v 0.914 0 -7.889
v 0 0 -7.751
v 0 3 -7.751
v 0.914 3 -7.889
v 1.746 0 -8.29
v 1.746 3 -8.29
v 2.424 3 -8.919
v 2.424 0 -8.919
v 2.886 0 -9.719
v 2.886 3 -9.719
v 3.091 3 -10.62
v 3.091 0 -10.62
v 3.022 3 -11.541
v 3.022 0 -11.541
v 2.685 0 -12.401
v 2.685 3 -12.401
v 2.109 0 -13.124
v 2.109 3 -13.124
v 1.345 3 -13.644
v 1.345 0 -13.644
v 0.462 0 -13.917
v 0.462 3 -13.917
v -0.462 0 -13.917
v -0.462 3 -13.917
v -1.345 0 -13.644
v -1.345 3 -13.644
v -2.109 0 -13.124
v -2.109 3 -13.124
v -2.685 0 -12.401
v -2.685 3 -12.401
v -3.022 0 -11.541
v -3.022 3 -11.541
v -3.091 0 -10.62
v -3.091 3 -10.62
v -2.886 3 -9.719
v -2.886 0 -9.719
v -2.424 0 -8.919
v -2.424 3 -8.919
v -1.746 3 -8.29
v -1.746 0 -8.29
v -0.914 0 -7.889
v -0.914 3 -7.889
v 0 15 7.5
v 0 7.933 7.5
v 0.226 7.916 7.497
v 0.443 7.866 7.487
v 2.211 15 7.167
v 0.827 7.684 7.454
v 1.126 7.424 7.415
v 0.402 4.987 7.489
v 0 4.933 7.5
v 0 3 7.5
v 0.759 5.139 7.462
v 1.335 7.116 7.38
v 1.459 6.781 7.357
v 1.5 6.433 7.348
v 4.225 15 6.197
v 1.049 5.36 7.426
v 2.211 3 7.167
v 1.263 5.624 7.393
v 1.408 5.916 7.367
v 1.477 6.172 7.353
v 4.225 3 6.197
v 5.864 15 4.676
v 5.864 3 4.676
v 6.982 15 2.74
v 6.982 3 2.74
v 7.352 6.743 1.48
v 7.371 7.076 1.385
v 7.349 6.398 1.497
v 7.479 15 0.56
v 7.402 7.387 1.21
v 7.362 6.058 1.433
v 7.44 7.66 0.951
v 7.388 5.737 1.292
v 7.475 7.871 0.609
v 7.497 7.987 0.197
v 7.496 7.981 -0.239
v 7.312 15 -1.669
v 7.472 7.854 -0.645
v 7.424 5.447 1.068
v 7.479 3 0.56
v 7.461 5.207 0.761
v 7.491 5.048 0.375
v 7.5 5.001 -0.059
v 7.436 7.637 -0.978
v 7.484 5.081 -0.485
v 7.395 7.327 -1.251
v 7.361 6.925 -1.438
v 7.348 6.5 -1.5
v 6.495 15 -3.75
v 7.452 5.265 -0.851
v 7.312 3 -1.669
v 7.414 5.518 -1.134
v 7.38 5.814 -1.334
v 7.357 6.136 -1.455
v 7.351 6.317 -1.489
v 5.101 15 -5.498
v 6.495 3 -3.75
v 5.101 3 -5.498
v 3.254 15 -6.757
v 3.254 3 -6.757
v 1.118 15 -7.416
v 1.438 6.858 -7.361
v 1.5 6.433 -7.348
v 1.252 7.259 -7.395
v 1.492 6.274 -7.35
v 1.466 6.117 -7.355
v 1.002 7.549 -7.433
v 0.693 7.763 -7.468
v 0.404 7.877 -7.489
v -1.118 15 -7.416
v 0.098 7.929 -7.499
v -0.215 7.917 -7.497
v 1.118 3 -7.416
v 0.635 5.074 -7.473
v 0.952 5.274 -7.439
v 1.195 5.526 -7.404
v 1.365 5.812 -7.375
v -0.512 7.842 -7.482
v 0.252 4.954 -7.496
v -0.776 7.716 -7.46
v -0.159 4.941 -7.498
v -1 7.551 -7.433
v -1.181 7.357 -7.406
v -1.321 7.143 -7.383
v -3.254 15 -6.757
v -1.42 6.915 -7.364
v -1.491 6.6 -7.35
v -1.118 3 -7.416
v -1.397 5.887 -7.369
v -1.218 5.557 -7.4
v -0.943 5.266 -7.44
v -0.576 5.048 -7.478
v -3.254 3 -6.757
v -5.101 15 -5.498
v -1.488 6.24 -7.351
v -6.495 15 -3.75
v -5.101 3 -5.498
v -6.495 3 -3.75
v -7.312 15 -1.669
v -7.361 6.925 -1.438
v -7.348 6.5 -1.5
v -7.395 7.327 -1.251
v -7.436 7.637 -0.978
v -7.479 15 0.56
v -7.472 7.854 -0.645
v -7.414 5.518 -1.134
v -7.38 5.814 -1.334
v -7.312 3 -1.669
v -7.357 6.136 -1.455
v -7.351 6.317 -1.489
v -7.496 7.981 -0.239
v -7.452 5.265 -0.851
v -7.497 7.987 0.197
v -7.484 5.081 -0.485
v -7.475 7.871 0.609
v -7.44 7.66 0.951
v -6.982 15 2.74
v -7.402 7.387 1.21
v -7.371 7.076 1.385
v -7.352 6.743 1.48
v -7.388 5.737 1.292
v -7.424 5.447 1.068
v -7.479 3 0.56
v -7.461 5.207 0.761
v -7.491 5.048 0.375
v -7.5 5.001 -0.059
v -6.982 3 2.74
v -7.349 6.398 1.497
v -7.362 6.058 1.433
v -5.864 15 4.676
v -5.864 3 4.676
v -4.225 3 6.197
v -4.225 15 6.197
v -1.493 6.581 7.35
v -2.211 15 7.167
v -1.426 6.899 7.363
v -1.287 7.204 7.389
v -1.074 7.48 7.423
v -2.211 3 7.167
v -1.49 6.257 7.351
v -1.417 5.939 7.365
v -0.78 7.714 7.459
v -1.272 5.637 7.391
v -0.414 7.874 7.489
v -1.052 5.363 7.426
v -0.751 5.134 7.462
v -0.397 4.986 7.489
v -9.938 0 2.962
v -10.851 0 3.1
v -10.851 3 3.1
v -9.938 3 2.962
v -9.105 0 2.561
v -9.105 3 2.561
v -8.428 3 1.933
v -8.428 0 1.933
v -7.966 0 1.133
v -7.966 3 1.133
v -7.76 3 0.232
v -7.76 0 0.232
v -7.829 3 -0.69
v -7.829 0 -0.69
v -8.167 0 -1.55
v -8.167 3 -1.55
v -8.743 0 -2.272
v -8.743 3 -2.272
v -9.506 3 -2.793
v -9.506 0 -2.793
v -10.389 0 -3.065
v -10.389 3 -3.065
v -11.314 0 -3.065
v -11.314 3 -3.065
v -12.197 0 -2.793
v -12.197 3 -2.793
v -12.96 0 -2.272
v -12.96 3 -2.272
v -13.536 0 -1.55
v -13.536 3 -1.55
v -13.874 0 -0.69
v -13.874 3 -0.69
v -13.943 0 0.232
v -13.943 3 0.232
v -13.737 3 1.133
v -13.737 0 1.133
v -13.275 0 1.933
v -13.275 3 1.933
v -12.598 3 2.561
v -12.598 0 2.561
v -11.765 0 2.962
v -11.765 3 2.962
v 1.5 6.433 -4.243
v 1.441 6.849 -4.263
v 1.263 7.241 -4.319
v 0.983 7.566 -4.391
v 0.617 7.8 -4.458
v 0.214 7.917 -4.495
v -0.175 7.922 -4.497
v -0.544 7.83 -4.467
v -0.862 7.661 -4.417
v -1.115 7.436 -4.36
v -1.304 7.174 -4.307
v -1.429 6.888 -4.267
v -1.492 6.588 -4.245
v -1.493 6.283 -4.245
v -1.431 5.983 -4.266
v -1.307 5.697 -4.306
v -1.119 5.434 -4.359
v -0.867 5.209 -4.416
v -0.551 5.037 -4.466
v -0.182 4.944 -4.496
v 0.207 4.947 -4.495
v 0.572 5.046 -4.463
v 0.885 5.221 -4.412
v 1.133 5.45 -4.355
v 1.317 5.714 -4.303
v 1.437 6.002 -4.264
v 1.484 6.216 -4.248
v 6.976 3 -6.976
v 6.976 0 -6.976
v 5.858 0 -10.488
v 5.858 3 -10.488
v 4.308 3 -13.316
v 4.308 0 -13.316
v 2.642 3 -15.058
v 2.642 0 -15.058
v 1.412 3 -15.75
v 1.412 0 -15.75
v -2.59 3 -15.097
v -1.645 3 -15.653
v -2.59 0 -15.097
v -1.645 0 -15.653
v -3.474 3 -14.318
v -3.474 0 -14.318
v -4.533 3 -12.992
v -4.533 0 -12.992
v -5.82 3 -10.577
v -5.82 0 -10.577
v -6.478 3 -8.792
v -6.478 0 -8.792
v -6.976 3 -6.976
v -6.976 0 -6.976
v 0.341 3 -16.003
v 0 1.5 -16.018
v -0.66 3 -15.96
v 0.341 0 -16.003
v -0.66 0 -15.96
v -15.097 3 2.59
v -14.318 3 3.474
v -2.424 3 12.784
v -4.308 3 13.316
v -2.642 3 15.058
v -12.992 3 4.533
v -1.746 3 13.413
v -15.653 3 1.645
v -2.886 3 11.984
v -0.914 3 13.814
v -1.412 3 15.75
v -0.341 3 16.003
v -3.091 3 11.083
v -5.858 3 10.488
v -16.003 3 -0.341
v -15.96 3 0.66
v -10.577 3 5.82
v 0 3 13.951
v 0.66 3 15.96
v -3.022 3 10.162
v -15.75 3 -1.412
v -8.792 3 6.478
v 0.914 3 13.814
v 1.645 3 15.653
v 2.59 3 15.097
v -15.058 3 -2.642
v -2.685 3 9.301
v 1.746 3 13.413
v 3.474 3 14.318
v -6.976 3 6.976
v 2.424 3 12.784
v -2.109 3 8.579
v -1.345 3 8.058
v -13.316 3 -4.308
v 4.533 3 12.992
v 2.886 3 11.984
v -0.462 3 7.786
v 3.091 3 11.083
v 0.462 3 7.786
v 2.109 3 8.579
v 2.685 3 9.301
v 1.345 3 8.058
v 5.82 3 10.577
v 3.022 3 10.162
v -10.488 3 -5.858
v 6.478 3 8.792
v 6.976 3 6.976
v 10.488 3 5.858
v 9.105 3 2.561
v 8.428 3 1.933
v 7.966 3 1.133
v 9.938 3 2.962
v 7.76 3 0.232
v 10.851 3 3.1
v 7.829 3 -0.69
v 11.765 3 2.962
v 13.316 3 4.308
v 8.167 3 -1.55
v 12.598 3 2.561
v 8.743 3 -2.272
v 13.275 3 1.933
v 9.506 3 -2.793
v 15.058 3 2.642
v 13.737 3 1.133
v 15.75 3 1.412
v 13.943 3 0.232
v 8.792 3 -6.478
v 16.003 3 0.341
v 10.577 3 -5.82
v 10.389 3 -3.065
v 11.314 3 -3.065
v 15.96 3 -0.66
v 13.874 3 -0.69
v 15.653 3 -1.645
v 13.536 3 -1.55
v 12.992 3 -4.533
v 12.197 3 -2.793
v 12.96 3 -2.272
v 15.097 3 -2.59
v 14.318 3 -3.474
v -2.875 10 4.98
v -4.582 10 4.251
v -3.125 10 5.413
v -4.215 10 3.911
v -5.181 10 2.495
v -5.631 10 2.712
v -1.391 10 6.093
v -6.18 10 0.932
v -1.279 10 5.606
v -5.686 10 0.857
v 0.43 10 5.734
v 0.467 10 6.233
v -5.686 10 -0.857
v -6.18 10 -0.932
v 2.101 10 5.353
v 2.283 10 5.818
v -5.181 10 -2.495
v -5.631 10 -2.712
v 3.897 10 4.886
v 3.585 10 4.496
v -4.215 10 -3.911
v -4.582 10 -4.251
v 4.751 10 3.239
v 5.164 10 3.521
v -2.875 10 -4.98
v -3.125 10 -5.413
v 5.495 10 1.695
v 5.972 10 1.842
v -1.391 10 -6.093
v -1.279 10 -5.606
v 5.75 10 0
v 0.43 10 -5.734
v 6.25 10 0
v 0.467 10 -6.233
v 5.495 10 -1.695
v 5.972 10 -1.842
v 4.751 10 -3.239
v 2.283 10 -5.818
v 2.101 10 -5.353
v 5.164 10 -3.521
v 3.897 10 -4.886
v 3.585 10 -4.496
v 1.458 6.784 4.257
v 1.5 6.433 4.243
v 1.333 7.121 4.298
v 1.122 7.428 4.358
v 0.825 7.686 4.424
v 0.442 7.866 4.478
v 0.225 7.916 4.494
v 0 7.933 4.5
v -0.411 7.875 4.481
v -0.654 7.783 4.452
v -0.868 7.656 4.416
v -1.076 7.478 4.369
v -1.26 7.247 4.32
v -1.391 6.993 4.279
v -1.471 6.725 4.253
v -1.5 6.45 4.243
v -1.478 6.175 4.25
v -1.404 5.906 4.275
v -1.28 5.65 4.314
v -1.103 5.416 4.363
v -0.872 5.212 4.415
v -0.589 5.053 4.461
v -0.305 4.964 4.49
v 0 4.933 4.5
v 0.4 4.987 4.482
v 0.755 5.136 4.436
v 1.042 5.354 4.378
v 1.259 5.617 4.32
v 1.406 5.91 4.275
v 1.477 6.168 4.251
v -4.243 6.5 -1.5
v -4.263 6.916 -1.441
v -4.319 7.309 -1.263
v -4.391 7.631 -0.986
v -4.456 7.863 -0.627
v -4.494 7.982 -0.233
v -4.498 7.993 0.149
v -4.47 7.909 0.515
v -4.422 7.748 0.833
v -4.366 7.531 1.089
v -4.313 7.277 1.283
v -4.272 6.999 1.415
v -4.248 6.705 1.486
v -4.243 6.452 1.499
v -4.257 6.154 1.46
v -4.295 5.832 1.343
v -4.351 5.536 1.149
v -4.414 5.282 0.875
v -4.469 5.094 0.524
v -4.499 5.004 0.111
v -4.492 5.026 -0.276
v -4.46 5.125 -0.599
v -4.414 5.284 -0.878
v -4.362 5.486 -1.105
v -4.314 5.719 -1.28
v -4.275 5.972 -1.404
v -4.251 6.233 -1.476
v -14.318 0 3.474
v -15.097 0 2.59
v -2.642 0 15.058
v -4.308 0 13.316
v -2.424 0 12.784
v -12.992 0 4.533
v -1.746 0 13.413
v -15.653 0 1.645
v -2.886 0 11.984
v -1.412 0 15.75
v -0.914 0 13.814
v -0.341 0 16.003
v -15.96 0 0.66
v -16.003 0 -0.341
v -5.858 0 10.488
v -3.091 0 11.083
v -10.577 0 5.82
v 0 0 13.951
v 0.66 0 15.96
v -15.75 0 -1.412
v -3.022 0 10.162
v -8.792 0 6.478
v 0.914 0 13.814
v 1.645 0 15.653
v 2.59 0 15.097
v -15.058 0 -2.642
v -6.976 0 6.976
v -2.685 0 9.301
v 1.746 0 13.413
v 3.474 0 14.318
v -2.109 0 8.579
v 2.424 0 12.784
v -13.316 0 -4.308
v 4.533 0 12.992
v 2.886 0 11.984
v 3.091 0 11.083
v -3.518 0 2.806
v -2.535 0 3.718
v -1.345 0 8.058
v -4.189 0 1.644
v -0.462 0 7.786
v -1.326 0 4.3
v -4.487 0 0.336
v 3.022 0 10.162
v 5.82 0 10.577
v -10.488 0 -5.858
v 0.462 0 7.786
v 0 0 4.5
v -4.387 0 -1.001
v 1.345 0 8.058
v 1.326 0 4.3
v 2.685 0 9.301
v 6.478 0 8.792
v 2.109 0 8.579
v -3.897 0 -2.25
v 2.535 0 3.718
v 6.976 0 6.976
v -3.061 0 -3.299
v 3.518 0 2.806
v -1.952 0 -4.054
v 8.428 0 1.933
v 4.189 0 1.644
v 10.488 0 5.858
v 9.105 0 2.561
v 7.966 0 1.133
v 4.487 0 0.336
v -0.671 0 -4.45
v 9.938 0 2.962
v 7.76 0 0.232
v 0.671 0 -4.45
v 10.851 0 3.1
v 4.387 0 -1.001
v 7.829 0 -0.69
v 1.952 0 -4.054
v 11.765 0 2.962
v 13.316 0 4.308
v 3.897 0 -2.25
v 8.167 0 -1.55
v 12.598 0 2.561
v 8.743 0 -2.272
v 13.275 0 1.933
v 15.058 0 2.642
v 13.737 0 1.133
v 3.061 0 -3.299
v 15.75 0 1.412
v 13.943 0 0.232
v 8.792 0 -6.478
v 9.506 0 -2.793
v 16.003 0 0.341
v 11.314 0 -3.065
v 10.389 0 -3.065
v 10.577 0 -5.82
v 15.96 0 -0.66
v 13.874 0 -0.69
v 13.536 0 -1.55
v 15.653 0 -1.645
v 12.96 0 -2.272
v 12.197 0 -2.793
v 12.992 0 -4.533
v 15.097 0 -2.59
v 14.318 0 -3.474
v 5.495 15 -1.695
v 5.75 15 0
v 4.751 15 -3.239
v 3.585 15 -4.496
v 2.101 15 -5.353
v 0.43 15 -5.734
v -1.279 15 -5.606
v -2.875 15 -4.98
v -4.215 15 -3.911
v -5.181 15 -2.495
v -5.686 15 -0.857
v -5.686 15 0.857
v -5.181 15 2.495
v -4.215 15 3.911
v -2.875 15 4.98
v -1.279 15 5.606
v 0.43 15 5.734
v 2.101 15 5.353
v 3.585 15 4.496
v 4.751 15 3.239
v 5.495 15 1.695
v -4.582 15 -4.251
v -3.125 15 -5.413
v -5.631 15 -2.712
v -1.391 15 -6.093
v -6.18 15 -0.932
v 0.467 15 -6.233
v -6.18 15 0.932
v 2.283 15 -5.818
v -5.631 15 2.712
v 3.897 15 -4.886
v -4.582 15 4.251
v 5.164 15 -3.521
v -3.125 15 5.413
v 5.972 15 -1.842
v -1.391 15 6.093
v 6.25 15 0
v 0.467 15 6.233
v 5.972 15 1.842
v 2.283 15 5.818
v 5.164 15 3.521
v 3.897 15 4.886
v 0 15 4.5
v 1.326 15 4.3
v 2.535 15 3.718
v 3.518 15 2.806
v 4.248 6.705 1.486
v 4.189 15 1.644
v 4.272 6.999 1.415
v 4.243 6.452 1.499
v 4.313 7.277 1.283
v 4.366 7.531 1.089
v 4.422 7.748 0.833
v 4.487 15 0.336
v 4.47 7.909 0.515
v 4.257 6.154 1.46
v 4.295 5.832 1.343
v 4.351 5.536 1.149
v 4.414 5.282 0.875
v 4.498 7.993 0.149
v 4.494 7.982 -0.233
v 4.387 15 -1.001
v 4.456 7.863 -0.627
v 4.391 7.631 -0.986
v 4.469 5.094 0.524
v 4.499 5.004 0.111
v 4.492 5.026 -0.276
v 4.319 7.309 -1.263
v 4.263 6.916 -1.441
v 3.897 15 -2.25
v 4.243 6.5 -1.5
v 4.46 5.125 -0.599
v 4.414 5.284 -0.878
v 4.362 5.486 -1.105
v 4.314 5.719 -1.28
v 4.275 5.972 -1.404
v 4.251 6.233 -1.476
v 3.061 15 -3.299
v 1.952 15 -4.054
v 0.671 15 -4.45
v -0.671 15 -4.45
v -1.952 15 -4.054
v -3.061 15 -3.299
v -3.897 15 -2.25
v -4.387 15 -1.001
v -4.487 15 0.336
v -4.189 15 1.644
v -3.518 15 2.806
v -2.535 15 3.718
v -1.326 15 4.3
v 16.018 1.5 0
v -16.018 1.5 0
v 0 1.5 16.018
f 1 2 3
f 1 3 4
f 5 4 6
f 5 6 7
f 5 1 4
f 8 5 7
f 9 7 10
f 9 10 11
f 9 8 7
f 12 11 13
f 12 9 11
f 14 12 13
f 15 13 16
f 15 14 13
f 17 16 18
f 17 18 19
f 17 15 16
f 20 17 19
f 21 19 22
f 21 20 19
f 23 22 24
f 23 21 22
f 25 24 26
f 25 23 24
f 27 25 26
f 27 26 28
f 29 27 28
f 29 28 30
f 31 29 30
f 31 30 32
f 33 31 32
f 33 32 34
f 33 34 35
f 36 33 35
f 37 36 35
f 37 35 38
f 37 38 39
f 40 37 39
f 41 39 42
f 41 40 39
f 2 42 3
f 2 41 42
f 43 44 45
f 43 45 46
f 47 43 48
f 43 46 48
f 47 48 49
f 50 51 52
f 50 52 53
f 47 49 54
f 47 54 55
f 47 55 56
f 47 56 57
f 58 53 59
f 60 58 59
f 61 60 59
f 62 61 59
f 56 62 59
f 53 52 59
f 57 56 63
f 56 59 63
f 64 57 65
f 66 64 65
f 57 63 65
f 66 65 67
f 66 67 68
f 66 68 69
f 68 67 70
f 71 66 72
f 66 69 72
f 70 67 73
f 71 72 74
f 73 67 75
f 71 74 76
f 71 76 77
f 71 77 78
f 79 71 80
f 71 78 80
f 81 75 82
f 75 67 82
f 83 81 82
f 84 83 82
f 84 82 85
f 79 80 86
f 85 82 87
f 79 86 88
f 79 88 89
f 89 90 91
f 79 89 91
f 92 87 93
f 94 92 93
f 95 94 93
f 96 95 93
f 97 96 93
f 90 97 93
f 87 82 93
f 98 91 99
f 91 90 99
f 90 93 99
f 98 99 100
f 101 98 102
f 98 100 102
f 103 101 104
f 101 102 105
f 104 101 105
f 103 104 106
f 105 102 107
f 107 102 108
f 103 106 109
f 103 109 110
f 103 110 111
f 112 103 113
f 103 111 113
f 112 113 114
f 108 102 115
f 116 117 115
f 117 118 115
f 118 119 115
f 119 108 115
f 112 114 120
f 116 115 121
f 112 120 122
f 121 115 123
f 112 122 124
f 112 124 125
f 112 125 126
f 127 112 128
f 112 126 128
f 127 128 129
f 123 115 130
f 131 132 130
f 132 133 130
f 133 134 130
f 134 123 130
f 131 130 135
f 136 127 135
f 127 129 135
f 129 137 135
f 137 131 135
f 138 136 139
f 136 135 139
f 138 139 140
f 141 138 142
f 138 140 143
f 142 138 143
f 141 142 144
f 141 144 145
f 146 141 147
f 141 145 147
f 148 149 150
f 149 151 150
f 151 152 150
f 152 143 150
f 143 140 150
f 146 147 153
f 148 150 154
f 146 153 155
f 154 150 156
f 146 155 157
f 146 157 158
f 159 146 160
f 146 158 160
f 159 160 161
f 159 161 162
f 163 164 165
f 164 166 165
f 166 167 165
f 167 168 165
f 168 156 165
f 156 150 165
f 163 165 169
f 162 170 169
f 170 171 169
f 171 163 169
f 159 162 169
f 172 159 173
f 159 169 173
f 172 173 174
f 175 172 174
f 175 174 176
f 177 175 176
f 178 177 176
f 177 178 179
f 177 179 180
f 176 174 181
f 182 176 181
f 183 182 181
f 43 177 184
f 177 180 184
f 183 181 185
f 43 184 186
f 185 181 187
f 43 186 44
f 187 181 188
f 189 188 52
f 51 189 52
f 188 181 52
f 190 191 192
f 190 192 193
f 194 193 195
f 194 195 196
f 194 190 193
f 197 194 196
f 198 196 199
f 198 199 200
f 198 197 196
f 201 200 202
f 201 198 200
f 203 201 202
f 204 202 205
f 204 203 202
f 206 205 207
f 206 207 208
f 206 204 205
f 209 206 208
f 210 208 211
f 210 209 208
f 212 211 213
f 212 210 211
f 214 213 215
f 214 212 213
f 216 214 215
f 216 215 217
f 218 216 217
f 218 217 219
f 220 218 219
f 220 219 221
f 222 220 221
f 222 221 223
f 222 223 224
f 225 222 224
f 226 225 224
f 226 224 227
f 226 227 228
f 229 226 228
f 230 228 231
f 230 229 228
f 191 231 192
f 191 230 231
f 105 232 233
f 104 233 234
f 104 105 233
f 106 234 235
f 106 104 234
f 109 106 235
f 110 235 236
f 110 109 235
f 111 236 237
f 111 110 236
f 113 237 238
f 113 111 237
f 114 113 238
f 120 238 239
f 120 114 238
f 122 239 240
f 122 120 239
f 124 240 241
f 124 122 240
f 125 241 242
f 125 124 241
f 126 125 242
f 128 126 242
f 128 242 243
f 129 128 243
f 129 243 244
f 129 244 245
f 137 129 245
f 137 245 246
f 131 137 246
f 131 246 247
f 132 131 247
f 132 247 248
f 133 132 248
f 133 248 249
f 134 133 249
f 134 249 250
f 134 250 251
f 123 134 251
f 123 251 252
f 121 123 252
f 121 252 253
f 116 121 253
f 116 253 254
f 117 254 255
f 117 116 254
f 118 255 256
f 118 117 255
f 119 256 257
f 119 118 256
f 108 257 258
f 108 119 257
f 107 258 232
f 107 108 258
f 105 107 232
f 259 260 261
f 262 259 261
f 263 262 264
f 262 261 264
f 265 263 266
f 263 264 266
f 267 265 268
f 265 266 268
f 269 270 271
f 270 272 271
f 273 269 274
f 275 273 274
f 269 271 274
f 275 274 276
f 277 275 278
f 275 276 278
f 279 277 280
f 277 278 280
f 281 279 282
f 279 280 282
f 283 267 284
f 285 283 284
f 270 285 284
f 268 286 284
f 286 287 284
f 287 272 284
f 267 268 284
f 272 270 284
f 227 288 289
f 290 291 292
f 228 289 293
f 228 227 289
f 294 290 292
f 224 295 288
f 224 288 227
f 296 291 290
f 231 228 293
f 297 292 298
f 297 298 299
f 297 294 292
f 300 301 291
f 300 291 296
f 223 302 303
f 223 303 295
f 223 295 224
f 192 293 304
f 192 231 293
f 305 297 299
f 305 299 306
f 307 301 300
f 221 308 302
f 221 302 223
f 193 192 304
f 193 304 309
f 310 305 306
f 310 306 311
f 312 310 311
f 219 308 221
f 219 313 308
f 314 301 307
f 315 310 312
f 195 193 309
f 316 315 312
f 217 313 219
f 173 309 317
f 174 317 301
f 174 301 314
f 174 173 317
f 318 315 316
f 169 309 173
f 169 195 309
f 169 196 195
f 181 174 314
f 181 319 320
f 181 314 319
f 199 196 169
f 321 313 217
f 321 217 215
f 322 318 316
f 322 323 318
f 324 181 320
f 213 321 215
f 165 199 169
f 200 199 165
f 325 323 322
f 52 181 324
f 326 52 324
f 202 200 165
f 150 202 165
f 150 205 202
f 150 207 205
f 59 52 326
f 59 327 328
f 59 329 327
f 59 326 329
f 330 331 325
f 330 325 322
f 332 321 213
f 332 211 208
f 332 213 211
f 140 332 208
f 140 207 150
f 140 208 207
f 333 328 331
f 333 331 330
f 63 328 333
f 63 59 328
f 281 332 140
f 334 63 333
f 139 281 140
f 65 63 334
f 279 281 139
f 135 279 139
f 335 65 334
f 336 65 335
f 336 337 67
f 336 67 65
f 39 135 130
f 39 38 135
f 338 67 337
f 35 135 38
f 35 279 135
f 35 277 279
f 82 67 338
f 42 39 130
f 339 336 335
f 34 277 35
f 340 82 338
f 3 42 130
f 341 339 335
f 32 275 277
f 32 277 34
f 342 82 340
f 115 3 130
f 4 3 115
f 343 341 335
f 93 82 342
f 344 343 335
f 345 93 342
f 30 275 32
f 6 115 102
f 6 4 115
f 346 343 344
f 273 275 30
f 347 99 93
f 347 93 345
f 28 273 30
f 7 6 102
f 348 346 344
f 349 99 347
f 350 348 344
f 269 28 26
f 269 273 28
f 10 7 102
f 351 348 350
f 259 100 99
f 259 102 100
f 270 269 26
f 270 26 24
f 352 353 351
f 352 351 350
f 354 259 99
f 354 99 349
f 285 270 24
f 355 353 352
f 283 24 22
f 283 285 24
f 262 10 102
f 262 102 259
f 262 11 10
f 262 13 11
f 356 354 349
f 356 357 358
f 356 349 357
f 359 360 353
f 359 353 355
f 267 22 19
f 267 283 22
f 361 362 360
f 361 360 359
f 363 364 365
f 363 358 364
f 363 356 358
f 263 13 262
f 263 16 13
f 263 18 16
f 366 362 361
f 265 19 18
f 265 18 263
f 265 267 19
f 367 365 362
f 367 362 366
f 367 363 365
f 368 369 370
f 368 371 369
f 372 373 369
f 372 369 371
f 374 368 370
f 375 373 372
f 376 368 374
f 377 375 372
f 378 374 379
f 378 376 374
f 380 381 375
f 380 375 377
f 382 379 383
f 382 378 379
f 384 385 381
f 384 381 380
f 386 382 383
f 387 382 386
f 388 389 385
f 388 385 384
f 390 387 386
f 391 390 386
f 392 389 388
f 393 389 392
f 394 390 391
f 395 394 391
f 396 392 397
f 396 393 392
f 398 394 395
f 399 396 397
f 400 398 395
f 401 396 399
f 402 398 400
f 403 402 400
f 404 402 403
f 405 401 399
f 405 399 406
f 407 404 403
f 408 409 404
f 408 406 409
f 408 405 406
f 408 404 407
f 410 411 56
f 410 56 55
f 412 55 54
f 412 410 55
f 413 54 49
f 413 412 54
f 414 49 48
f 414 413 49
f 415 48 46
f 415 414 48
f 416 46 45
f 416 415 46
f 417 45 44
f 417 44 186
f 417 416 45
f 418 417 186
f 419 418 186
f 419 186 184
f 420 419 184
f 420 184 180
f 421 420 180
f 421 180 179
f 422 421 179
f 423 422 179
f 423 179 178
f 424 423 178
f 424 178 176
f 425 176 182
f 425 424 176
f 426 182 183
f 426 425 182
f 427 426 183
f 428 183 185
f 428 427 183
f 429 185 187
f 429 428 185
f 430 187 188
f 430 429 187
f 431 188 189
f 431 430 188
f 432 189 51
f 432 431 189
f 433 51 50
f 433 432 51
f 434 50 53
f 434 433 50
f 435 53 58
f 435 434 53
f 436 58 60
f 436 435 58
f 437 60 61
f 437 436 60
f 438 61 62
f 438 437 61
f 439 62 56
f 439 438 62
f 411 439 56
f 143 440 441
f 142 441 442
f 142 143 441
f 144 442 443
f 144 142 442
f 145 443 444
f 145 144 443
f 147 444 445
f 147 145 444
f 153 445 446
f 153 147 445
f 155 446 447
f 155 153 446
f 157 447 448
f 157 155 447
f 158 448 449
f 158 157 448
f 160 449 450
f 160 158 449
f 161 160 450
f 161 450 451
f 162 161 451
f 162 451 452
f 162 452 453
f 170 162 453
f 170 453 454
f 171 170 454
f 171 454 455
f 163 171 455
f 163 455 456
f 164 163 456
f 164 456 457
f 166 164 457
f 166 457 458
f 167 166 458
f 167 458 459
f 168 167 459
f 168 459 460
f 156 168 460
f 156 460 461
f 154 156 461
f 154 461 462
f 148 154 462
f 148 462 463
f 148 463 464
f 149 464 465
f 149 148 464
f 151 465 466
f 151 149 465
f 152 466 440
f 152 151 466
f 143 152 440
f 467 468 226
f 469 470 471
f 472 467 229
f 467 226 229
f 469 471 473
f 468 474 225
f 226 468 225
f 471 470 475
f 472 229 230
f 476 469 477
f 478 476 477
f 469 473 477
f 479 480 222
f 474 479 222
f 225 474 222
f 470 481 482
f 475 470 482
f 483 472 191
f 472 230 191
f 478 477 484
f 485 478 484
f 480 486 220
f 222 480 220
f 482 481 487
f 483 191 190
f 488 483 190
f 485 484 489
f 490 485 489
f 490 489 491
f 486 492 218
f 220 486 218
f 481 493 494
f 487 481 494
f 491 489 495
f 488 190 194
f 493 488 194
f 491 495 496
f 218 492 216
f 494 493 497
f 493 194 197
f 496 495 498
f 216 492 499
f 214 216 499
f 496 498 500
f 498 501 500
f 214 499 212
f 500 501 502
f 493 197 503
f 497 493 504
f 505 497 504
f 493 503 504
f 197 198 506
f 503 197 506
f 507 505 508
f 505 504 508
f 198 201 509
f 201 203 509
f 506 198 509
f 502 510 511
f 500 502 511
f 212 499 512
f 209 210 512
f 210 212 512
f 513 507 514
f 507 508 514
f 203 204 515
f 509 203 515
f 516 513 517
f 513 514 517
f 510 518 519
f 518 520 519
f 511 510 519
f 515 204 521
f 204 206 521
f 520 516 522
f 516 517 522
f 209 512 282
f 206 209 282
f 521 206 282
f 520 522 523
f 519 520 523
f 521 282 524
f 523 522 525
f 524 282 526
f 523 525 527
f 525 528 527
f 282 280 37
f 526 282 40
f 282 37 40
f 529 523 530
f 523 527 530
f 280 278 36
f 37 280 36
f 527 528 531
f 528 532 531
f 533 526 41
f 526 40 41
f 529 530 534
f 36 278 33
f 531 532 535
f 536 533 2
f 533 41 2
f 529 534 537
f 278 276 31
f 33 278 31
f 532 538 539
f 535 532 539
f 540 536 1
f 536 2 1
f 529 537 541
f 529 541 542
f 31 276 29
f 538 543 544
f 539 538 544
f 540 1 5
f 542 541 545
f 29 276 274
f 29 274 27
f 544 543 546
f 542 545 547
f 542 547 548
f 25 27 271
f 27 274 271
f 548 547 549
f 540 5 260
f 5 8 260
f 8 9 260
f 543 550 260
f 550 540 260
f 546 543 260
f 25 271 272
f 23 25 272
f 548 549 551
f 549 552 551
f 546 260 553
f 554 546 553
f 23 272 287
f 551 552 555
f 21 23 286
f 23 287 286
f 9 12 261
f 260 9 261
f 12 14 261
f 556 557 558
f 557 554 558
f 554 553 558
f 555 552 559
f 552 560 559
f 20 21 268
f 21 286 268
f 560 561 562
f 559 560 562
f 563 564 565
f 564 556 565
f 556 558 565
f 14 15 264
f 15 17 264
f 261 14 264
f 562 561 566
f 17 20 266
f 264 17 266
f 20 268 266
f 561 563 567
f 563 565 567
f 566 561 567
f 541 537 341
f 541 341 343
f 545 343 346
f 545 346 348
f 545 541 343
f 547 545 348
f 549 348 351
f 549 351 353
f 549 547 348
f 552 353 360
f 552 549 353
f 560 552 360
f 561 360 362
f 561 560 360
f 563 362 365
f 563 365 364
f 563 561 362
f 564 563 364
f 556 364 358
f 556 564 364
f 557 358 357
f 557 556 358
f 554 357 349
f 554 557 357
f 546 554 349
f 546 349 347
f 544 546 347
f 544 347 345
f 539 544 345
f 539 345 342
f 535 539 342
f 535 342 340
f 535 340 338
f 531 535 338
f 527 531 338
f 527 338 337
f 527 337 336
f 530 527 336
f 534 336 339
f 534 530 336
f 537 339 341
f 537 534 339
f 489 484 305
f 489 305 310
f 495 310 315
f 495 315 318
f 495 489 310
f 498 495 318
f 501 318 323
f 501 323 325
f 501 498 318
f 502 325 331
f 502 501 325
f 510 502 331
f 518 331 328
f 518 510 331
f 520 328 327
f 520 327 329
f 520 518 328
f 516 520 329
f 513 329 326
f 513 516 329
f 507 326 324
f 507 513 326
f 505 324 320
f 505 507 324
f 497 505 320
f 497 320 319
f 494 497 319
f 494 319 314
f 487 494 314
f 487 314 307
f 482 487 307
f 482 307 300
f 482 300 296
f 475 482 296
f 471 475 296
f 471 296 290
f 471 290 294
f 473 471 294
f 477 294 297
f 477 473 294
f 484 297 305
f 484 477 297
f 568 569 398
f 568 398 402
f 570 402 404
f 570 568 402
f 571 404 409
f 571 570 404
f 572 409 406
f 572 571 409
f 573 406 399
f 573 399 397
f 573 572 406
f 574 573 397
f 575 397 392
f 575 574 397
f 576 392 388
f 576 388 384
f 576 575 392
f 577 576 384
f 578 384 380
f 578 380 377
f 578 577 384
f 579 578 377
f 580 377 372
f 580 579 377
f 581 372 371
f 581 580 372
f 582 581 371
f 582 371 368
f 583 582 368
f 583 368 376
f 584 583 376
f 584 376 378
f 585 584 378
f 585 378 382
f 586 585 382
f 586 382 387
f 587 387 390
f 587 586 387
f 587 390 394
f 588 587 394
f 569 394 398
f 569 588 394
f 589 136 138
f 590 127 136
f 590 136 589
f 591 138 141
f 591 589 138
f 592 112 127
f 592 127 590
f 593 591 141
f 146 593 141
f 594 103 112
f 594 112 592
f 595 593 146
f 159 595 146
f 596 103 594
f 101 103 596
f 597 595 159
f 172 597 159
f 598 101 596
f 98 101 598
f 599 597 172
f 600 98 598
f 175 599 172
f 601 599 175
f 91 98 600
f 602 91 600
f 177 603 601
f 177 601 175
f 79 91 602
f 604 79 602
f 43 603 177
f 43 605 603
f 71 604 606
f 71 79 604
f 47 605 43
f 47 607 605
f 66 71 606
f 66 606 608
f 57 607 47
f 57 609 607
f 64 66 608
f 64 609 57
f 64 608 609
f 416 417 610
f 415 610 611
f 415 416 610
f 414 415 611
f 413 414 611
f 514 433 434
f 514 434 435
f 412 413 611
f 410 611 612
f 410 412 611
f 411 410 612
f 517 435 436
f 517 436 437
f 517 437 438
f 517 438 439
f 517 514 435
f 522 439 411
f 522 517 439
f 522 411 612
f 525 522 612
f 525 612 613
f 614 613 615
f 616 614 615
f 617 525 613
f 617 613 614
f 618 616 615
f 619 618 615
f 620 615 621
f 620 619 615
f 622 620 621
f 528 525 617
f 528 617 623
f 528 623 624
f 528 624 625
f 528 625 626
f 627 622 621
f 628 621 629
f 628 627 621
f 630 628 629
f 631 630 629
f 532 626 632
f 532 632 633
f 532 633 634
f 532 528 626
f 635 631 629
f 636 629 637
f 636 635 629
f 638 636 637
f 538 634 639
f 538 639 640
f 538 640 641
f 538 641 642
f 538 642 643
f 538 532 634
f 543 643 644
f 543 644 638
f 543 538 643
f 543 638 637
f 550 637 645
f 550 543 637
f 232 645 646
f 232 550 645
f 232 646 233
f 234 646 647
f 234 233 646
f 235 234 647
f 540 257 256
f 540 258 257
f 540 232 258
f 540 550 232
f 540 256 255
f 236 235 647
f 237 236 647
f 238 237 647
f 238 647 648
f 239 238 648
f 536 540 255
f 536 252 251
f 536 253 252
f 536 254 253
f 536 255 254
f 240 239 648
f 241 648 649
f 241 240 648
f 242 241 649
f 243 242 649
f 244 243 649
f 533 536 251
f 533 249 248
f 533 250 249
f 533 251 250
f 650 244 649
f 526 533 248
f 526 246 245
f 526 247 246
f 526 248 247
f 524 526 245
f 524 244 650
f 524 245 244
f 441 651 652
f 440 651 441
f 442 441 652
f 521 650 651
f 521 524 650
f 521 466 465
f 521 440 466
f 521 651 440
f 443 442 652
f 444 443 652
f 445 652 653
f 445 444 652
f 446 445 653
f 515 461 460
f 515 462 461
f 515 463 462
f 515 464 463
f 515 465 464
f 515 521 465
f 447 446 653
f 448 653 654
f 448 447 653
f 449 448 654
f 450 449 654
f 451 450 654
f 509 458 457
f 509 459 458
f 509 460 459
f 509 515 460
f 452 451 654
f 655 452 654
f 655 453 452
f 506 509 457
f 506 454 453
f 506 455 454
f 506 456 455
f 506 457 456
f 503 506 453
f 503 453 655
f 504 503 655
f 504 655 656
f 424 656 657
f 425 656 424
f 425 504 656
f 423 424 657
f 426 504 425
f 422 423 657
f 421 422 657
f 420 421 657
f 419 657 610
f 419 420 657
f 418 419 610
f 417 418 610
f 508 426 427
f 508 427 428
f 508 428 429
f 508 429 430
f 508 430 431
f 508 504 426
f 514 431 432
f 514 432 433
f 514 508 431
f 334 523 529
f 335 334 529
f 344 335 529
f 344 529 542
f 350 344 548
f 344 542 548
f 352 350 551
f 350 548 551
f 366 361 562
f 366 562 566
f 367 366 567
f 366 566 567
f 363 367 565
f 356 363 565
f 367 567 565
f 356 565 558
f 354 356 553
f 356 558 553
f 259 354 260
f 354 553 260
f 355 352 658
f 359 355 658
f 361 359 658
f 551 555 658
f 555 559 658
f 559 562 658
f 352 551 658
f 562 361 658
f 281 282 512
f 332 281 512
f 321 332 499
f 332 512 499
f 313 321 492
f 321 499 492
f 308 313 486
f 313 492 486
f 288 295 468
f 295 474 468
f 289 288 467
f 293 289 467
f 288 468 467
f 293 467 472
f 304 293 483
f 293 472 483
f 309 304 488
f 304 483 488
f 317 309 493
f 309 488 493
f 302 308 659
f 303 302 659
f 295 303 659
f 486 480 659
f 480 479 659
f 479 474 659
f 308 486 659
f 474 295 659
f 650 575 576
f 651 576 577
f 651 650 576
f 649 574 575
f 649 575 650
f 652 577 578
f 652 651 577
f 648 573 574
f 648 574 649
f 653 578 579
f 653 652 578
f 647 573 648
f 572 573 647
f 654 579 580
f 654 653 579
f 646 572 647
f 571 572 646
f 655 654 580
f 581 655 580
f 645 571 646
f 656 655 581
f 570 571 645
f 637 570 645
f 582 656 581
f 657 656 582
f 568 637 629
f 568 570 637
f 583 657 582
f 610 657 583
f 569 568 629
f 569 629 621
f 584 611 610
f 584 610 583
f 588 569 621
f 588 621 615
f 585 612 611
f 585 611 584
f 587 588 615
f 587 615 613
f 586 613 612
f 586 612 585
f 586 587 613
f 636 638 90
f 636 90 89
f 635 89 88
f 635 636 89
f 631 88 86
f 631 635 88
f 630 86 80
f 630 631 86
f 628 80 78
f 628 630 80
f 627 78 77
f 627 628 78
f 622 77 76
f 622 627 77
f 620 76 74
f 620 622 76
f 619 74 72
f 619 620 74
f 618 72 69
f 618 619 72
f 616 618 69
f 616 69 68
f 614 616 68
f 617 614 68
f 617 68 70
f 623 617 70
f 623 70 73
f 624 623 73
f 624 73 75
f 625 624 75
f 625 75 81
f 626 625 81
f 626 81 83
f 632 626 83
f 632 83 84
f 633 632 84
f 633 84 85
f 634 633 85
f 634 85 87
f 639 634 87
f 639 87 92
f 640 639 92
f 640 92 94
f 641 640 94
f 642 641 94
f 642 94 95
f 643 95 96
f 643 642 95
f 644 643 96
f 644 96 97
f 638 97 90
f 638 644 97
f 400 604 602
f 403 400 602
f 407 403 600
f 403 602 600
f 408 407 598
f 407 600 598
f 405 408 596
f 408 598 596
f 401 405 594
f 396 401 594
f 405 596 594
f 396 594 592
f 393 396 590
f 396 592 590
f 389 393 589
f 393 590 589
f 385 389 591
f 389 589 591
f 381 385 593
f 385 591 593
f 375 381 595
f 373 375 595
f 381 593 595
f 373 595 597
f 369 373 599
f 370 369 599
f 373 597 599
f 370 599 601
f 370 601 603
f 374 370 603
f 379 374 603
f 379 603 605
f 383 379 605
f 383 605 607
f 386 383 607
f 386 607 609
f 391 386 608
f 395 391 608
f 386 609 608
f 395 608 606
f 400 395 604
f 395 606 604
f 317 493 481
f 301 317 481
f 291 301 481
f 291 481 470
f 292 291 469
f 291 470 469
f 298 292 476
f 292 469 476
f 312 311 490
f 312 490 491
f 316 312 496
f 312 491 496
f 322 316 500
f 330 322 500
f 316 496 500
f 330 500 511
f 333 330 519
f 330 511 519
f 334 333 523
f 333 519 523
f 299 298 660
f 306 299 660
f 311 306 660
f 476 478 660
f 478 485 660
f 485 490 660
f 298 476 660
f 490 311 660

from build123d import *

# Parameters (mm, degrees)
SKETCH1_R               = 3.1
SKETCH1_R_2             = 7.5
BOSS_EXTRUDE1_DEPTH     = 3
SKETCH1_3_R             = 7.5
SKETCH1_3_R_2           = 4.5
BOSS_EXTRUDE2_DEPTH     = 10
CUT_EXTRUDE1_DEPTH      = 25.762107606
CUT_EXTRUDE1_DEPTH_BACK = 25.762107606
SKETCH2_R               = 1.5
CUT_EXTRUDE2_DEPTH      = 25.762107646
CUT_EXTRUDE2_DEPTH_BACK = 25.762107646
SKETCH3_R               = 1.5
SKETCH29_R              = 7.5
SKETCH29_R_2            = 4.5
BOSS_EXTRUDE3_DEPTH     = 5
SKETCH30_R              = 6.25
SKETCH30_R_2            = 5.75
CUT_EXTRUDE_THIN1_DEPTH = 5


with BuildPart() as part:
    # Sketch1 → Boss-Extrude1 (new body)
    with BuildSketch(Plane(origin=(0, 0, 0), x_dir=(1, 0, 0), z_dir=(0, 1, 0))):
        with BuildLine():
            add(Edge.make_bspline(
                [(6.976356378, 6.976356378), (0, 36.778651981), (-6.976356378, 6.976356378)],
                knots=[2.021421456, 2.021421456, 2.021421456, 4.261763851, 4.261763851, 4.261763851], degree=2, weights=[1, 0.435528345, 1]))
            add(Edge.make_bspline(
                [(-6.976356378, 6.976356378), (-36.778651981, 0), (-6.976356378, -6.976356378)],
                knots=[5.16301411, 5.16301411, 5.16301411, 7.403356504, 7.403356504, 7.403356504], degree=2, weights=[1, 0.435528345, 1]))
            add(Edge.make_bspline(
                [(-6.976356378, -6.976356378), (0, -36.778651981), (6.976356378, -6.976356378)],
                knots=[5.16301411, 5.16301411, 5.16301411, 7.403356504, 7.403356504, 7.403356504], degree=2, weights=[1, 0.435528345, 1]))
            add(Edge.make_bspline(
                [(6.976356378, -6.976356378), (36.778651981, 0), (6.976356378, 6.976356378)],
                knots=[2.021421456, 2.021421456, 2.021421456, 4.261763851, 4.261763851, 4.261763851], degree=2, weights=[1, 0.435528345, 1]))
        make_face()
        with Locations((0, -10.851478773)):
            Circle(SKETCH1_R, mode=Mode.SUBTRACT)
        with Locations((-10.851478773, 0)):
            Circle(SKETCH1_R, mode=Mode.SUBTRACT)
        Circle(SKETCH1_R_2, mode=Mode.SUBTRACT)
        with Locations((10.851478773, 0)):
            Circle(SKETCH1_R, mode=Mode.SUBTRACT)
        with Locations((0, 10.851478773)):
            Circle(SKETCH1_R, mode=Mode.SUBTRACT)
    extrude(amount=BOSS_EXTRUDE1_DEPTH)

    # Sketch1<3> → Boss-Extrude2 (add)
    with BuildSketch(Plane(origin=(0, 0, 0), x_dir=(1, 0, 0), z_dir=(0, 1, 0))):
        Circle(SKETCH1_3_R)
        Circle(SKETCH1_3_R_2, mode=Mode.SUBTRACT)
    extrude(amount=BOSS_EXTRUDE2_DEPTH)

    # Sketch2 → Cut-Extrude1 (cut, two sides: drawn at the far end of the back side and taken through both)
    with BuildSketch(Plane.XY.offset(-CUT_EXTRUDE1_DEPTH_BACK)):
        with Locations((0, 6.432645923)):
            Circle(SKETCH2_R)
    extrude(amount=CUT_EXTRUDE1_DEPTH + CUT_EXTRUDE1_DEPTH_BACK, mode=Mode.SUBTRACT)

    # Sketch3 → Cut-Extrude2 (cut, two sides: drawn at the far end of the back side and taken through both)
    with BuildSketch(Plane(origin=(0, 0, 0), x_dir=(0, 0, -1), z_dir=(1, 0, 0)).offset(-CUT_EXTRUDE2_DEPTH_BACK)):
        with Locations((0, 6.5)):
            Circle(SKETCH3_R)
    extrude(amount=CUT_EXTRUDE2_DEPTH + CUT_EXTRUDE2_DEPTH_BACK, mode=Mode.SUBTRACT)

    # Sketch29 → Boss-Extrude3 (add)
    with BuildSketch(Plane(origin=(0, 10, 0), x_dir=(1, 0, 0), z_dir=(0, 1, 0))):
        Circle(SKETCH29_R)
        Circle(SKETCH29_R_2, mode=Mode.SUBTRACT)
    extrude(amount=BOSS_EXTRUDE3_DEPTH)

    # Sketch30 → Cut-Extrude-Thin1 (cut)
    with BuildSketch(Plane(origin=(0, 15, 0), x_dir=(1, 0, 0), z_dir=(0, 1, 0))):
        Circle(SKETCH30_R)
        Circle(SKETCH30_R_2, mode=Mode.SUBTRACT)
    extrude(amount=-CUT_EXTRUDE_THIN1_DEPTH, mode=Mode.SUBTRACT)


solid = part.part
